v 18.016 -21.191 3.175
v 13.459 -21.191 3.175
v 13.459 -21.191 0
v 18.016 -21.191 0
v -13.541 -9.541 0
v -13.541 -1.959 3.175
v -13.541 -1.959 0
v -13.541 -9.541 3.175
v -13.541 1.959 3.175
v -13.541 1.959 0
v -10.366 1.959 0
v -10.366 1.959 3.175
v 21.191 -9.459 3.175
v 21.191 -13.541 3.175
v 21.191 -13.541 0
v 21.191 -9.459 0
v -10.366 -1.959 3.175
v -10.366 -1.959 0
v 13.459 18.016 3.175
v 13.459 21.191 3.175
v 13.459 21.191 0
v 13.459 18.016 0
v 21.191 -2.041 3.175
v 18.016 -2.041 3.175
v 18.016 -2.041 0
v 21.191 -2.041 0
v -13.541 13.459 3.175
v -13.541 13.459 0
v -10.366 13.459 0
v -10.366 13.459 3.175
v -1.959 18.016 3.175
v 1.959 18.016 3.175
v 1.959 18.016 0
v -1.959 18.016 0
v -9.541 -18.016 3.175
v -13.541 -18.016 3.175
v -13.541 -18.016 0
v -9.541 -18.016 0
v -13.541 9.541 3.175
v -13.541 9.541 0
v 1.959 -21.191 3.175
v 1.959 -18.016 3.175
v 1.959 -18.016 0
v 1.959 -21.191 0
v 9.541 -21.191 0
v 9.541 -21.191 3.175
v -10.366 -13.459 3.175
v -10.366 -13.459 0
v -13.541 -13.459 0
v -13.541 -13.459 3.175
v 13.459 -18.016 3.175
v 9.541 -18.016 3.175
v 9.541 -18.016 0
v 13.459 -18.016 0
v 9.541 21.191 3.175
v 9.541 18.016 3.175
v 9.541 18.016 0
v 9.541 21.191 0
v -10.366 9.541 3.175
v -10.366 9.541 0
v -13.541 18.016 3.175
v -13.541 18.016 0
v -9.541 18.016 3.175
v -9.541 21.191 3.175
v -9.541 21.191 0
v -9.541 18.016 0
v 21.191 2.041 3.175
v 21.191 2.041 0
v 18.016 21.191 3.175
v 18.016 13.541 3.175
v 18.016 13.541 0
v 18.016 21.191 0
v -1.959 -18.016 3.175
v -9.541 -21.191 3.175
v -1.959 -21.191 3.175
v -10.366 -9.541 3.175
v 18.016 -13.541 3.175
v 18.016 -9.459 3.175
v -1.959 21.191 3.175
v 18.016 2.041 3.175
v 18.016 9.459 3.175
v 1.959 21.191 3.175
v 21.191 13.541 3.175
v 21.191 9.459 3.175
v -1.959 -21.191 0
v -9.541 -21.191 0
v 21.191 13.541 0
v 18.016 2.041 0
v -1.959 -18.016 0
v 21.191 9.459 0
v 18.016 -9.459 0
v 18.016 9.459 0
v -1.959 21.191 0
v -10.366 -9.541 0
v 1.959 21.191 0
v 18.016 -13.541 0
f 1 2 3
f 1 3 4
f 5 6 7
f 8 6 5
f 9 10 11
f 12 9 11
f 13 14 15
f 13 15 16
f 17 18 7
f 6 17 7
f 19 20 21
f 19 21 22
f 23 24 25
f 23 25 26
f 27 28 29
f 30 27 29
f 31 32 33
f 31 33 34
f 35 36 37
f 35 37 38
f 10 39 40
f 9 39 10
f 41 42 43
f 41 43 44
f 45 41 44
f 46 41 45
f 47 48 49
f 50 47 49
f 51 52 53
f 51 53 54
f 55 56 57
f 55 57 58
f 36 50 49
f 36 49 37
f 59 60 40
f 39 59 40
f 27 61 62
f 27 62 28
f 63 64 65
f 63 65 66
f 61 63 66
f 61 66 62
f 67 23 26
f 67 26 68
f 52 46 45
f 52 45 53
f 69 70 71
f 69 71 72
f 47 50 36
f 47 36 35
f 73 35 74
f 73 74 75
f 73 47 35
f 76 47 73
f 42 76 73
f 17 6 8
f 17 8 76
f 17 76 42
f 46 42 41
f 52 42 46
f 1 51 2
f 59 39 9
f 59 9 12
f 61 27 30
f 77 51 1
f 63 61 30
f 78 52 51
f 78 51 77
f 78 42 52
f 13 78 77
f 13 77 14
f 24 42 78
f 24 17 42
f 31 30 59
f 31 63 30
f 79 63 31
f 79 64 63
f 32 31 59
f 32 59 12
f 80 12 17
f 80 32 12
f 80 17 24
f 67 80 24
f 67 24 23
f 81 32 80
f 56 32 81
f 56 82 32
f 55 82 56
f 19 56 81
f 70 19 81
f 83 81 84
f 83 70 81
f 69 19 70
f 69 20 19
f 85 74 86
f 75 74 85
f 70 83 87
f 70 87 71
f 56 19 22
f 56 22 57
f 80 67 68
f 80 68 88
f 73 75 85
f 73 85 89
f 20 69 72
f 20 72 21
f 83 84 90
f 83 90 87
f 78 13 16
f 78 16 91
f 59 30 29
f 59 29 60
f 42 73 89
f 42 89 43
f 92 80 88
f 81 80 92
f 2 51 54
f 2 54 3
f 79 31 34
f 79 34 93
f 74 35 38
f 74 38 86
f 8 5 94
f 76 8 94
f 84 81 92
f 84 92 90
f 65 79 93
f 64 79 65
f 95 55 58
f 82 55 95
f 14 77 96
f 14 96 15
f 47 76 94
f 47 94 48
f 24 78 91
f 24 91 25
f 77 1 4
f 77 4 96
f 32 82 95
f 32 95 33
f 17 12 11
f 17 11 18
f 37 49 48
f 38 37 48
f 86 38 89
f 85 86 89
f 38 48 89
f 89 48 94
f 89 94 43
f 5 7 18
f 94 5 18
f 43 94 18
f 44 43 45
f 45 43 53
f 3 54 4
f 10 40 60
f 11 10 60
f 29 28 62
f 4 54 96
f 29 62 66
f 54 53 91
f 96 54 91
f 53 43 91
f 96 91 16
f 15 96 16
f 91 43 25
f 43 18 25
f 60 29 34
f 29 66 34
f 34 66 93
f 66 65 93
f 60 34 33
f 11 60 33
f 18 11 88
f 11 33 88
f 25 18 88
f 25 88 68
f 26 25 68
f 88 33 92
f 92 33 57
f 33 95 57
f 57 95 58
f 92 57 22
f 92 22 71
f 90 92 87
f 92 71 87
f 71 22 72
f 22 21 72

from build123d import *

# Parameters (mm, degrees)
BOSS_EXTRUDE1_DEPTH = 3.175
SKETCH4_W           = 3.175
SKETCH4_H           = 4
CUT_EXTRUDE1_DEPTH  = 10
BOSS_EXTRUDE2_DEPTH = 3.175


with BuildPart() as part:
    # Sketch2 → Boss-Extrude1 (new body)
    with BuildSketch(Plane.XY):
        Polygon((-2, 17.975), (-2, 21.15), (-9.5, 21.15), (-9.5, 17.975), (-13.5, 17.975), (-13.5, 21.15), (-21.15, 21.15), (-21.15, 13.5), (-17.975, 13.5), (-17.975, 9.5), (-21.15, 9.5), (-21.15, 2), (-17.975, 2), (-17.975, -2), (-21.15, -2), (-21.15, -9.5), (-17.975, -9.5), (-17.975, -13.5), (-21.15, -13.5), (-21.15, -21.15), (-13.5, -21.15), (-13.5, -17.975), (-9.5, -17.975), (-9.5, -21.15), (-2, -21.15), (-2, -17.975), (2, -17.975), (2, -21.15), (9.5, -21.15), (9.5, -17.975), (13.5, -17.975), (13.5, -21.15), (17.975, -21.15), (17.975, -13.5), (21.15, -13.5), (21.15, -9.5), (17.975, -9.5), (17.975, -2), (21.15, -2), (21.15, 2), (17.975, 2), (17.975, 9.5), (21.15, 9.5), (21.15, 13.5), (17.975, 13.5), (17.975, 21.15), (13.5, 21.15), (13.5, 17.975), (9.5, 17.975), (9.5, 21.15), (2, 21.15), (2, 17.975), align=None)
    extrude(amount=BOSS_EXTRUDE1_DEPTH)

    # Sketch4 → Cut-Extrude1 (cut)
    with BuildSketch(Plane.XY.offset(3.175)):
        Polygon((-13.5, 13.5), (-13.5, 17.975), (-13.5, 21.15), (-21.15, 21.15), (-21.15, -21.15), (-13.5, -21.15), (-13.5, -17.975), (-13.5, -13.5), (-13.5, -9.5), (-13.5, -2), (-13.5, 2), (-13.5, 9.5), align=None)
        with Locations((-11.9125, 11.5)):
            Rectangle(SKETCH4_W, SKETCH4_H)
        with Locations((-11.9125, 0)):
            Rectangle(SKETCH4_W, SKETCH4_H)
        with Locations((-11.9125, -11.5)):
            Rectangle(SKETCH4_W, SKETCH4_H)
    extrude(amount=-CUT_EXTRUDE1_DEPTH, mode=Mode.SUBTRACT)

    # Sketch3 → Boss-Extrude2 (add)
    with BuildSketch(Plane.XY.offset(3.175)):
        Polygon((-13.54064, 18.01564), (-13.54064, 13.45936), (-10.36564, 13.45936), (-10.36564, 9.54064), (-13.54064, 9.54064), (-13.54064, 1.95936), (-10.36564, 1.95936), (-10.36564, -1.95936), (-13.54064, -1.95936), (-13.54064, -9.54064), (-10.36564, -9.54064), (-10.36564, -13.45936), (-13.54064, -13.45936), (-13.54064, -18.01564), (-9.54064, -18.01564), (-9.54064, -21.19064), (-1.95936, -21.19064), (-1.95936, -18.01564), (1.95936, -18.01564), (1.95936, -21.19064), (9.54064, -21.19064), (9.54064, -18.01564), (13.45936, -18.01564), (13.45936, -21.19064), (18.01564, -21.19064), (18.01564, -13.54064), (21.19064, -13.54064), (21.19064, -9.45936), (18.01564, -9.45936), (18.01564, -2.04064), (21.19064, -2.04064), (21.19064, 2.04064), (18.01564, 2.04064), (18.01564, 9.45936), (21.19064, 9.45936), (21.19064, 13.54064), (18.01564, 13.54064), (18.01564, 21.19064), (13.45936, 21.19064), (13.45936, 18.01564), (9.54064, 18.01564), (9.54064, 21.19064), (1.95936, 21.19064), (1.95936, 18.01564), (-1.95936, 18.01564), (-1.95936, 21.19064), (-9.54064, 21.19064), (-9.54064, 18.01564), align=None)
    extrude(amount=-BOSS_EXTRUDE2_DEPTH)


solid = part.part
